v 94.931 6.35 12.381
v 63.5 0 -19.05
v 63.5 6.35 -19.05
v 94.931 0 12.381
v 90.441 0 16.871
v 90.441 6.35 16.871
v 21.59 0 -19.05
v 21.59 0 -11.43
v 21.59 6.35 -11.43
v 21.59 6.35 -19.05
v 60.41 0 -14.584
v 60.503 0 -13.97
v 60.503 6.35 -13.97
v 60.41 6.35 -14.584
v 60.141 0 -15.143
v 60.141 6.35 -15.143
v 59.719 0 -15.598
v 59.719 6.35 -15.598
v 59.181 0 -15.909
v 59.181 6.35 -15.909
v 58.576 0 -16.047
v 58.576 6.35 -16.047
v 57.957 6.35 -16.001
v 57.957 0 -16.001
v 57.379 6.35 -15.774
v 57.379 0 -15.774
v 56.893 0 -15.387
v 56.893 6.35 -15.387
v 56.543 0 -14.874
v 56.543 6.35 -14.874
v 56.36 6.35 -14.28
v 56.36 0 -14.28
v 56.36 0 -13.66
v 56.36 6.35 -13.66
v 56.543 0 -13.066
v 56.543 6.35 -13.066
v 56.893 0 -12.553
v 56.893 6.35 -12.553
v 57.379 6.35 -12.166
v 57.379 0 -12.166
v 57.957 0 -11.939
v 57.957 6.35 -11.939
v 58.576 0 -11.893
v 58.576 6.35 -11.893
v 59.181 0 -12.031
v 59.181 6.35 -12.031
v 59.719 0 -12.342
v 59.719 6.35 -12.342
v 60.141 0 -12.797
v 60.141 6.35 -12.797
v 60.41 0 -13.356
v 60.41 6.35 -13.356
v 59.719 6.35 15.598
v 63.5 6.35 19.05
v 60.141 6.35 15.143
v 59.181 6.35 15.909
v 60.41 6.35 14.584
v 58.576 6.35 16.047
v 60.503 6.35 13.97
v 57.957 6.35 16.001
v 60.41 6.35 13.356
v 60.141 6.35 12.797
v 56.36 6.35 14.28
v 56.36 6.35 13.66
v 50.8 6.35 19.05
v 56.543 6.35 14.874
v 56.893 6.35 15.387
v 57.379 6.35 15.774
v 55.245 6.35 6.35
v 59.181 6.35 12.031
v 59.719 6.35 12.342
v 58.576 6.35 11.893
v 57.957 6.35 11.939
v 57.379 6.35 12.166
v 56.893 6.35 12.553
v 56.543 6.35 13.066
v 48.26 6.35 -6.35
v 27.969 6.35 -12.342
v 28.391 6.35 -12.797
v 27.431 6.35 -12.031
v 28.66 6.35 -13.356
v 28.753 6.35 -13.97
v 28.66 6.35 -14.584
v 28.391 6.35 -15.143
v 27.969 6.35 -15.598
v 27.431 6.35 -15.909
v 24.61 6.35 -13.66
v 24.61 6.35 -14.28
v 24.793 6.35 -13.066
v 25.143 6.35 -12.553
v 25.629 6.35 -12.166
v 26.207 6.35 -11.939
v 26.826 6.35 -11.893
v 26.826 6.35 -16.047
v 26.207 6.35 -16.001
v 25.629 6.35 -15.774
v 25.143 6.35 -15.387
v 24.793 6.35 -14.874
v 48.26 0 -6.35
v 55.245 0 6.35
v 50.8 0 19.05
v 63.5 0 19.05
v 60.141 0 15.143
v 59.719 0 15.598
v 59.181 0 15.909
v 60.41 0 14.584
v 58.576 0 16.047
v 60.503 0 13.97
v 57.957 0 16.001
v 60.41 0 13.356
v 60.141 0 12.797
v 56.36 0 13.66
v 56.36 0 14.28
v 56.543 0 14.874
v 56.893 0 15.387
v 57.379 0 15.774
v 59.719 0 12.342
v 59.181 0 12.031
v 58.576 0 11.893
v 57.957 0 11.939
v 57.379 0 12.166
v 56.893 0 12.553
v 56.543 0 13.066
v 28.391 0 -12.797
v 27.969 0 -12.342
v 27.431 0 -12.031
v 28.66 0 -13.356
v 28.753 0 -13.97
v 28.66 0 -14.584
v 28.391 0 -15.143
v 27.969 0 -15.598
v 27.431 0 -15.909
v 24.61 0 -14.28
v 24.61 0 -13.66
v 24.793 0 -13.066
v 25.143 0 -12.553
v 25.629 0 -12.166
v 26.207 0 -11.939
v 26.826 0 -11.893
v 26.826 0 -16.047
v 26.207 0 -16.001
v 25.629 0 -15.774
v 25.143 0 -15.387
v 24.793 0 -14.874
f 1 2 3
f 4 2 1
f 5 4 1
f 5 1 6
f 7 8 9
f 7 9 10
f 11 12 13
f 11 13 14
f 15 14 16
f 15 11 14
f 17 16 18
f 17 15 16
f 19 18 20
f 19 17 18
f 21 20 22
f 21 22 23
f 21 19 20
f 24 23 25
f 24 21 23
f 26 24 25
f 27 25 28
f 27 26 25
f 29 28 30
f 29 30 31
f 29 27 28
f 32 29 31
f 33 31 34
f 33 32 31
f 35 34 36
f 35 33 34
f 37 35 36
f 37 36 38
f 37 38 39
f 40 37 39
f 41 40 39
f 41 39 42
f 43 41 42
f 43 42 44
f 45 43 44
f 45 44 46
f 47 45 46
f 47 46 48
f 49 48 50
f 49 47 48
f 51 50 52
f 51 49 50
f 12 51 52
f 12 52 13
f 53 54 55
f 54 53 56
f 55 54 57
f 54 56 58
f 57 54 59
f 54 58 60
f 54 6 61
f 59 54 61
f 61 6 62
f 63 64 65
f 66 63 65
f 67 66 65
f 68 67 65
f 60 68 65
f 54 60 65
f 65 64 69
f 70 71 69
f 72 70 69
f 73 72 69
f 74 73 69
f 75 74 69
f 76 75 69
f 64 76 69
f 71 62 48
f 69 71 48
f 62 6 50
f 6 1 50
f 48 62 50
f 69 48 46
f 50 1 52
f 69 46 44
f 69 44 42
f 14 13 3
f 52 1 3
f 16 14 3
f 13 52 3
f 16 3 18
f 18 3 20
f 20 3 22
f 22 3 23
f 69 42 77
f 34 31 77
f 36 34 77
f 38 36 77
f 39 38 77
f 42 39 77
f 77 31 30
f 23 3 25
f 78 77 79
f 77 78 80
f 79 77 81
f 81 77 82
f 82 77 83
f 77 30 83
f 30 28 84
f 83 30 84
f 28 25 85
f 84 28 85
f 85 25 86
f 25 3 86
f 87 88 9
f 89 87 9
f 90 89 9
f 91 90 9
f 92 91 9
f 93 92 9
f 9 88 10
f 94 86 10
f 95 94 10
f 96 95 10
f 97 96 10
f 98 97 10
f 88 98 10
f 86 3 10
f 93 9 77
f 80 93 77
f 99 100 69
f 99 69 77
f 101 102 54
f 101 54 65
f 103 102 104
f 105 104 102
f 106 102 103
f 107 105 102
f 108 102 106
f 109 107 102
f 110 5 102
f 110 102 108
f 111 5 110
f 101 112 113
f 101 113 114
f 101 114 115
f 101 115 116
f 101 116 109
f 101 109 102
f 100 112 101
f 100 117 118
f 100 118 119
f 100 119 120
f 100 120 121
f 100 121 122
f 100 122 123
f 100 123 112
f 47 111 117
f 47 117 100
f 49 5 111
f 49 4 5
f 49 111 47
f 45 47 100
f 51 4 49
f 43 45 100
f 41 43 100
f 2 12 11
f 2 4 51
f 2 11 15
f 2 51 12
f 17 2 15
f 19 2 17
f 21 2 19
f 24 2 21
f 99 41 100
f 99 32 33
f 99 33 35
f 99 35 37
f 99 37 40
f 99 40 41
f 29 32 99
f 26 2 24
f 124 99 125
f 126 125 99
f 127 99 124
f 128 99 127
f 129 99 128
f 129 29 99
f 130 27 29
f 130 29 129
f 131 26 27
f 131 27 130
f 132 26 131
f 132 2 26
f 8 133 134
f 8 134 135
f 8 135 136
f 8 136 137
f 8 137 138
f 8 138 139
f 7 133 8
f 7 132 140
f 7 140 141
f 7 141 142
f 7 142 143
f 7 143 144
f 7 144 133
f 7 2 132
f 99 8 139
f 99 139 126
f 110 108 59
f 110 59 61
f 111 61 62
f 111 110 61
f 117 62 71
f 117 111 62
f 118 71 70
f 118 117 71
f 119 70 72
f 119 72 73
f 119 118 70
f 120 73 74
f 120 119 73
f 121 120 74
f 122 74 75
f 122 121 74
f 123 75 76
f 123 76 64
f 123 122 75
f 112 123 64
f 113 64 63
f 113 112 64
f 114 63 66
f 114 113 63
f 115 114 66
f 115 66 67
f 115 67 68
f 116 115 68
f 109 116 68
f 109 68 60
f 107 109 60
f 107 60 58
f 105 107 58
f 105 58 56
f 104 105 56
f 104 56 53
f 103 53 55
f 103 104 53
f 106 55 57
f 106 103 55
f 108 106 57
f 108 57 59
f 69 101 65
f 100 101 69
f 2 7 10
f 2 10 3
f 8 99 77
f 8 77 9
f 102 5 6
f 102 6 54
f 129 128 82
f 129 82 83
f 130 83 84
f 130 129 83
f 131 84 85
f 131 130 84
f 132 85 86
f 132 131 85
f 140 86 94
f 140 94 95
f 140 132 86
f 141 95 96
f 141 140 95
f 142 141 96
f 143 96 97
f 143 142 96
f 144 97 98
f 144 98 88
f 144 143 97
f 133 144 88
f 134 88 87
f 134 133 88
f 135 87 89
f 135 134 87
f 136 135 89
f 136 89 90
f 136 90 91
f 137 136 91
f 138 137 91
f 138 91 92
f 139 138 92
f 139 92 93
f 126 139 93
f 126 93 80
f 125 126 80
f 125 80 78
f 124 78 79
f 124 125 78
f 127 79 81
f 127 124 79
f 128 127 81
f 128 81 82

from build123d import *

# Parameters (mm, degrees)
SKETCH2_R           = 2.0828
BOSS_EXTRUDE1_DEPTH = 6.35


with BuildPart() as part:
    # Sketch2 → Boss-Extrude1 (new body)
    with BuildSketch(Plane(origin=(0, 0, 0), x_dir=(1, 0, 0), z_dir=(0, 1, 0))):
        Polygon((63.5, 19.05), (94.930896424, -12.380896424), (90.440768363, -16.871024484), (63.5, -19.05), (50.8, -19.05), (55.245, -6.35), (48.26, 6.35), (21.59, 11.43), (21.59, 19.05), align=None)
        with Locations((58.42, 13.97)):
            Circle(SKETCH2_R, mode=Mode.SUBTRACT)
        with Locations((26.67, 13.97)):
            Circle(SKETCH2_R, mode=Mode.SUBTRACT)
        with Locations((58.42, -13.97)):
            Circle(SKETCH2_R, mode=Mode.SUBTRACT)
    extrude(amount=BOSS_EXTRUDE1_DEPTH)


solid = part.part
